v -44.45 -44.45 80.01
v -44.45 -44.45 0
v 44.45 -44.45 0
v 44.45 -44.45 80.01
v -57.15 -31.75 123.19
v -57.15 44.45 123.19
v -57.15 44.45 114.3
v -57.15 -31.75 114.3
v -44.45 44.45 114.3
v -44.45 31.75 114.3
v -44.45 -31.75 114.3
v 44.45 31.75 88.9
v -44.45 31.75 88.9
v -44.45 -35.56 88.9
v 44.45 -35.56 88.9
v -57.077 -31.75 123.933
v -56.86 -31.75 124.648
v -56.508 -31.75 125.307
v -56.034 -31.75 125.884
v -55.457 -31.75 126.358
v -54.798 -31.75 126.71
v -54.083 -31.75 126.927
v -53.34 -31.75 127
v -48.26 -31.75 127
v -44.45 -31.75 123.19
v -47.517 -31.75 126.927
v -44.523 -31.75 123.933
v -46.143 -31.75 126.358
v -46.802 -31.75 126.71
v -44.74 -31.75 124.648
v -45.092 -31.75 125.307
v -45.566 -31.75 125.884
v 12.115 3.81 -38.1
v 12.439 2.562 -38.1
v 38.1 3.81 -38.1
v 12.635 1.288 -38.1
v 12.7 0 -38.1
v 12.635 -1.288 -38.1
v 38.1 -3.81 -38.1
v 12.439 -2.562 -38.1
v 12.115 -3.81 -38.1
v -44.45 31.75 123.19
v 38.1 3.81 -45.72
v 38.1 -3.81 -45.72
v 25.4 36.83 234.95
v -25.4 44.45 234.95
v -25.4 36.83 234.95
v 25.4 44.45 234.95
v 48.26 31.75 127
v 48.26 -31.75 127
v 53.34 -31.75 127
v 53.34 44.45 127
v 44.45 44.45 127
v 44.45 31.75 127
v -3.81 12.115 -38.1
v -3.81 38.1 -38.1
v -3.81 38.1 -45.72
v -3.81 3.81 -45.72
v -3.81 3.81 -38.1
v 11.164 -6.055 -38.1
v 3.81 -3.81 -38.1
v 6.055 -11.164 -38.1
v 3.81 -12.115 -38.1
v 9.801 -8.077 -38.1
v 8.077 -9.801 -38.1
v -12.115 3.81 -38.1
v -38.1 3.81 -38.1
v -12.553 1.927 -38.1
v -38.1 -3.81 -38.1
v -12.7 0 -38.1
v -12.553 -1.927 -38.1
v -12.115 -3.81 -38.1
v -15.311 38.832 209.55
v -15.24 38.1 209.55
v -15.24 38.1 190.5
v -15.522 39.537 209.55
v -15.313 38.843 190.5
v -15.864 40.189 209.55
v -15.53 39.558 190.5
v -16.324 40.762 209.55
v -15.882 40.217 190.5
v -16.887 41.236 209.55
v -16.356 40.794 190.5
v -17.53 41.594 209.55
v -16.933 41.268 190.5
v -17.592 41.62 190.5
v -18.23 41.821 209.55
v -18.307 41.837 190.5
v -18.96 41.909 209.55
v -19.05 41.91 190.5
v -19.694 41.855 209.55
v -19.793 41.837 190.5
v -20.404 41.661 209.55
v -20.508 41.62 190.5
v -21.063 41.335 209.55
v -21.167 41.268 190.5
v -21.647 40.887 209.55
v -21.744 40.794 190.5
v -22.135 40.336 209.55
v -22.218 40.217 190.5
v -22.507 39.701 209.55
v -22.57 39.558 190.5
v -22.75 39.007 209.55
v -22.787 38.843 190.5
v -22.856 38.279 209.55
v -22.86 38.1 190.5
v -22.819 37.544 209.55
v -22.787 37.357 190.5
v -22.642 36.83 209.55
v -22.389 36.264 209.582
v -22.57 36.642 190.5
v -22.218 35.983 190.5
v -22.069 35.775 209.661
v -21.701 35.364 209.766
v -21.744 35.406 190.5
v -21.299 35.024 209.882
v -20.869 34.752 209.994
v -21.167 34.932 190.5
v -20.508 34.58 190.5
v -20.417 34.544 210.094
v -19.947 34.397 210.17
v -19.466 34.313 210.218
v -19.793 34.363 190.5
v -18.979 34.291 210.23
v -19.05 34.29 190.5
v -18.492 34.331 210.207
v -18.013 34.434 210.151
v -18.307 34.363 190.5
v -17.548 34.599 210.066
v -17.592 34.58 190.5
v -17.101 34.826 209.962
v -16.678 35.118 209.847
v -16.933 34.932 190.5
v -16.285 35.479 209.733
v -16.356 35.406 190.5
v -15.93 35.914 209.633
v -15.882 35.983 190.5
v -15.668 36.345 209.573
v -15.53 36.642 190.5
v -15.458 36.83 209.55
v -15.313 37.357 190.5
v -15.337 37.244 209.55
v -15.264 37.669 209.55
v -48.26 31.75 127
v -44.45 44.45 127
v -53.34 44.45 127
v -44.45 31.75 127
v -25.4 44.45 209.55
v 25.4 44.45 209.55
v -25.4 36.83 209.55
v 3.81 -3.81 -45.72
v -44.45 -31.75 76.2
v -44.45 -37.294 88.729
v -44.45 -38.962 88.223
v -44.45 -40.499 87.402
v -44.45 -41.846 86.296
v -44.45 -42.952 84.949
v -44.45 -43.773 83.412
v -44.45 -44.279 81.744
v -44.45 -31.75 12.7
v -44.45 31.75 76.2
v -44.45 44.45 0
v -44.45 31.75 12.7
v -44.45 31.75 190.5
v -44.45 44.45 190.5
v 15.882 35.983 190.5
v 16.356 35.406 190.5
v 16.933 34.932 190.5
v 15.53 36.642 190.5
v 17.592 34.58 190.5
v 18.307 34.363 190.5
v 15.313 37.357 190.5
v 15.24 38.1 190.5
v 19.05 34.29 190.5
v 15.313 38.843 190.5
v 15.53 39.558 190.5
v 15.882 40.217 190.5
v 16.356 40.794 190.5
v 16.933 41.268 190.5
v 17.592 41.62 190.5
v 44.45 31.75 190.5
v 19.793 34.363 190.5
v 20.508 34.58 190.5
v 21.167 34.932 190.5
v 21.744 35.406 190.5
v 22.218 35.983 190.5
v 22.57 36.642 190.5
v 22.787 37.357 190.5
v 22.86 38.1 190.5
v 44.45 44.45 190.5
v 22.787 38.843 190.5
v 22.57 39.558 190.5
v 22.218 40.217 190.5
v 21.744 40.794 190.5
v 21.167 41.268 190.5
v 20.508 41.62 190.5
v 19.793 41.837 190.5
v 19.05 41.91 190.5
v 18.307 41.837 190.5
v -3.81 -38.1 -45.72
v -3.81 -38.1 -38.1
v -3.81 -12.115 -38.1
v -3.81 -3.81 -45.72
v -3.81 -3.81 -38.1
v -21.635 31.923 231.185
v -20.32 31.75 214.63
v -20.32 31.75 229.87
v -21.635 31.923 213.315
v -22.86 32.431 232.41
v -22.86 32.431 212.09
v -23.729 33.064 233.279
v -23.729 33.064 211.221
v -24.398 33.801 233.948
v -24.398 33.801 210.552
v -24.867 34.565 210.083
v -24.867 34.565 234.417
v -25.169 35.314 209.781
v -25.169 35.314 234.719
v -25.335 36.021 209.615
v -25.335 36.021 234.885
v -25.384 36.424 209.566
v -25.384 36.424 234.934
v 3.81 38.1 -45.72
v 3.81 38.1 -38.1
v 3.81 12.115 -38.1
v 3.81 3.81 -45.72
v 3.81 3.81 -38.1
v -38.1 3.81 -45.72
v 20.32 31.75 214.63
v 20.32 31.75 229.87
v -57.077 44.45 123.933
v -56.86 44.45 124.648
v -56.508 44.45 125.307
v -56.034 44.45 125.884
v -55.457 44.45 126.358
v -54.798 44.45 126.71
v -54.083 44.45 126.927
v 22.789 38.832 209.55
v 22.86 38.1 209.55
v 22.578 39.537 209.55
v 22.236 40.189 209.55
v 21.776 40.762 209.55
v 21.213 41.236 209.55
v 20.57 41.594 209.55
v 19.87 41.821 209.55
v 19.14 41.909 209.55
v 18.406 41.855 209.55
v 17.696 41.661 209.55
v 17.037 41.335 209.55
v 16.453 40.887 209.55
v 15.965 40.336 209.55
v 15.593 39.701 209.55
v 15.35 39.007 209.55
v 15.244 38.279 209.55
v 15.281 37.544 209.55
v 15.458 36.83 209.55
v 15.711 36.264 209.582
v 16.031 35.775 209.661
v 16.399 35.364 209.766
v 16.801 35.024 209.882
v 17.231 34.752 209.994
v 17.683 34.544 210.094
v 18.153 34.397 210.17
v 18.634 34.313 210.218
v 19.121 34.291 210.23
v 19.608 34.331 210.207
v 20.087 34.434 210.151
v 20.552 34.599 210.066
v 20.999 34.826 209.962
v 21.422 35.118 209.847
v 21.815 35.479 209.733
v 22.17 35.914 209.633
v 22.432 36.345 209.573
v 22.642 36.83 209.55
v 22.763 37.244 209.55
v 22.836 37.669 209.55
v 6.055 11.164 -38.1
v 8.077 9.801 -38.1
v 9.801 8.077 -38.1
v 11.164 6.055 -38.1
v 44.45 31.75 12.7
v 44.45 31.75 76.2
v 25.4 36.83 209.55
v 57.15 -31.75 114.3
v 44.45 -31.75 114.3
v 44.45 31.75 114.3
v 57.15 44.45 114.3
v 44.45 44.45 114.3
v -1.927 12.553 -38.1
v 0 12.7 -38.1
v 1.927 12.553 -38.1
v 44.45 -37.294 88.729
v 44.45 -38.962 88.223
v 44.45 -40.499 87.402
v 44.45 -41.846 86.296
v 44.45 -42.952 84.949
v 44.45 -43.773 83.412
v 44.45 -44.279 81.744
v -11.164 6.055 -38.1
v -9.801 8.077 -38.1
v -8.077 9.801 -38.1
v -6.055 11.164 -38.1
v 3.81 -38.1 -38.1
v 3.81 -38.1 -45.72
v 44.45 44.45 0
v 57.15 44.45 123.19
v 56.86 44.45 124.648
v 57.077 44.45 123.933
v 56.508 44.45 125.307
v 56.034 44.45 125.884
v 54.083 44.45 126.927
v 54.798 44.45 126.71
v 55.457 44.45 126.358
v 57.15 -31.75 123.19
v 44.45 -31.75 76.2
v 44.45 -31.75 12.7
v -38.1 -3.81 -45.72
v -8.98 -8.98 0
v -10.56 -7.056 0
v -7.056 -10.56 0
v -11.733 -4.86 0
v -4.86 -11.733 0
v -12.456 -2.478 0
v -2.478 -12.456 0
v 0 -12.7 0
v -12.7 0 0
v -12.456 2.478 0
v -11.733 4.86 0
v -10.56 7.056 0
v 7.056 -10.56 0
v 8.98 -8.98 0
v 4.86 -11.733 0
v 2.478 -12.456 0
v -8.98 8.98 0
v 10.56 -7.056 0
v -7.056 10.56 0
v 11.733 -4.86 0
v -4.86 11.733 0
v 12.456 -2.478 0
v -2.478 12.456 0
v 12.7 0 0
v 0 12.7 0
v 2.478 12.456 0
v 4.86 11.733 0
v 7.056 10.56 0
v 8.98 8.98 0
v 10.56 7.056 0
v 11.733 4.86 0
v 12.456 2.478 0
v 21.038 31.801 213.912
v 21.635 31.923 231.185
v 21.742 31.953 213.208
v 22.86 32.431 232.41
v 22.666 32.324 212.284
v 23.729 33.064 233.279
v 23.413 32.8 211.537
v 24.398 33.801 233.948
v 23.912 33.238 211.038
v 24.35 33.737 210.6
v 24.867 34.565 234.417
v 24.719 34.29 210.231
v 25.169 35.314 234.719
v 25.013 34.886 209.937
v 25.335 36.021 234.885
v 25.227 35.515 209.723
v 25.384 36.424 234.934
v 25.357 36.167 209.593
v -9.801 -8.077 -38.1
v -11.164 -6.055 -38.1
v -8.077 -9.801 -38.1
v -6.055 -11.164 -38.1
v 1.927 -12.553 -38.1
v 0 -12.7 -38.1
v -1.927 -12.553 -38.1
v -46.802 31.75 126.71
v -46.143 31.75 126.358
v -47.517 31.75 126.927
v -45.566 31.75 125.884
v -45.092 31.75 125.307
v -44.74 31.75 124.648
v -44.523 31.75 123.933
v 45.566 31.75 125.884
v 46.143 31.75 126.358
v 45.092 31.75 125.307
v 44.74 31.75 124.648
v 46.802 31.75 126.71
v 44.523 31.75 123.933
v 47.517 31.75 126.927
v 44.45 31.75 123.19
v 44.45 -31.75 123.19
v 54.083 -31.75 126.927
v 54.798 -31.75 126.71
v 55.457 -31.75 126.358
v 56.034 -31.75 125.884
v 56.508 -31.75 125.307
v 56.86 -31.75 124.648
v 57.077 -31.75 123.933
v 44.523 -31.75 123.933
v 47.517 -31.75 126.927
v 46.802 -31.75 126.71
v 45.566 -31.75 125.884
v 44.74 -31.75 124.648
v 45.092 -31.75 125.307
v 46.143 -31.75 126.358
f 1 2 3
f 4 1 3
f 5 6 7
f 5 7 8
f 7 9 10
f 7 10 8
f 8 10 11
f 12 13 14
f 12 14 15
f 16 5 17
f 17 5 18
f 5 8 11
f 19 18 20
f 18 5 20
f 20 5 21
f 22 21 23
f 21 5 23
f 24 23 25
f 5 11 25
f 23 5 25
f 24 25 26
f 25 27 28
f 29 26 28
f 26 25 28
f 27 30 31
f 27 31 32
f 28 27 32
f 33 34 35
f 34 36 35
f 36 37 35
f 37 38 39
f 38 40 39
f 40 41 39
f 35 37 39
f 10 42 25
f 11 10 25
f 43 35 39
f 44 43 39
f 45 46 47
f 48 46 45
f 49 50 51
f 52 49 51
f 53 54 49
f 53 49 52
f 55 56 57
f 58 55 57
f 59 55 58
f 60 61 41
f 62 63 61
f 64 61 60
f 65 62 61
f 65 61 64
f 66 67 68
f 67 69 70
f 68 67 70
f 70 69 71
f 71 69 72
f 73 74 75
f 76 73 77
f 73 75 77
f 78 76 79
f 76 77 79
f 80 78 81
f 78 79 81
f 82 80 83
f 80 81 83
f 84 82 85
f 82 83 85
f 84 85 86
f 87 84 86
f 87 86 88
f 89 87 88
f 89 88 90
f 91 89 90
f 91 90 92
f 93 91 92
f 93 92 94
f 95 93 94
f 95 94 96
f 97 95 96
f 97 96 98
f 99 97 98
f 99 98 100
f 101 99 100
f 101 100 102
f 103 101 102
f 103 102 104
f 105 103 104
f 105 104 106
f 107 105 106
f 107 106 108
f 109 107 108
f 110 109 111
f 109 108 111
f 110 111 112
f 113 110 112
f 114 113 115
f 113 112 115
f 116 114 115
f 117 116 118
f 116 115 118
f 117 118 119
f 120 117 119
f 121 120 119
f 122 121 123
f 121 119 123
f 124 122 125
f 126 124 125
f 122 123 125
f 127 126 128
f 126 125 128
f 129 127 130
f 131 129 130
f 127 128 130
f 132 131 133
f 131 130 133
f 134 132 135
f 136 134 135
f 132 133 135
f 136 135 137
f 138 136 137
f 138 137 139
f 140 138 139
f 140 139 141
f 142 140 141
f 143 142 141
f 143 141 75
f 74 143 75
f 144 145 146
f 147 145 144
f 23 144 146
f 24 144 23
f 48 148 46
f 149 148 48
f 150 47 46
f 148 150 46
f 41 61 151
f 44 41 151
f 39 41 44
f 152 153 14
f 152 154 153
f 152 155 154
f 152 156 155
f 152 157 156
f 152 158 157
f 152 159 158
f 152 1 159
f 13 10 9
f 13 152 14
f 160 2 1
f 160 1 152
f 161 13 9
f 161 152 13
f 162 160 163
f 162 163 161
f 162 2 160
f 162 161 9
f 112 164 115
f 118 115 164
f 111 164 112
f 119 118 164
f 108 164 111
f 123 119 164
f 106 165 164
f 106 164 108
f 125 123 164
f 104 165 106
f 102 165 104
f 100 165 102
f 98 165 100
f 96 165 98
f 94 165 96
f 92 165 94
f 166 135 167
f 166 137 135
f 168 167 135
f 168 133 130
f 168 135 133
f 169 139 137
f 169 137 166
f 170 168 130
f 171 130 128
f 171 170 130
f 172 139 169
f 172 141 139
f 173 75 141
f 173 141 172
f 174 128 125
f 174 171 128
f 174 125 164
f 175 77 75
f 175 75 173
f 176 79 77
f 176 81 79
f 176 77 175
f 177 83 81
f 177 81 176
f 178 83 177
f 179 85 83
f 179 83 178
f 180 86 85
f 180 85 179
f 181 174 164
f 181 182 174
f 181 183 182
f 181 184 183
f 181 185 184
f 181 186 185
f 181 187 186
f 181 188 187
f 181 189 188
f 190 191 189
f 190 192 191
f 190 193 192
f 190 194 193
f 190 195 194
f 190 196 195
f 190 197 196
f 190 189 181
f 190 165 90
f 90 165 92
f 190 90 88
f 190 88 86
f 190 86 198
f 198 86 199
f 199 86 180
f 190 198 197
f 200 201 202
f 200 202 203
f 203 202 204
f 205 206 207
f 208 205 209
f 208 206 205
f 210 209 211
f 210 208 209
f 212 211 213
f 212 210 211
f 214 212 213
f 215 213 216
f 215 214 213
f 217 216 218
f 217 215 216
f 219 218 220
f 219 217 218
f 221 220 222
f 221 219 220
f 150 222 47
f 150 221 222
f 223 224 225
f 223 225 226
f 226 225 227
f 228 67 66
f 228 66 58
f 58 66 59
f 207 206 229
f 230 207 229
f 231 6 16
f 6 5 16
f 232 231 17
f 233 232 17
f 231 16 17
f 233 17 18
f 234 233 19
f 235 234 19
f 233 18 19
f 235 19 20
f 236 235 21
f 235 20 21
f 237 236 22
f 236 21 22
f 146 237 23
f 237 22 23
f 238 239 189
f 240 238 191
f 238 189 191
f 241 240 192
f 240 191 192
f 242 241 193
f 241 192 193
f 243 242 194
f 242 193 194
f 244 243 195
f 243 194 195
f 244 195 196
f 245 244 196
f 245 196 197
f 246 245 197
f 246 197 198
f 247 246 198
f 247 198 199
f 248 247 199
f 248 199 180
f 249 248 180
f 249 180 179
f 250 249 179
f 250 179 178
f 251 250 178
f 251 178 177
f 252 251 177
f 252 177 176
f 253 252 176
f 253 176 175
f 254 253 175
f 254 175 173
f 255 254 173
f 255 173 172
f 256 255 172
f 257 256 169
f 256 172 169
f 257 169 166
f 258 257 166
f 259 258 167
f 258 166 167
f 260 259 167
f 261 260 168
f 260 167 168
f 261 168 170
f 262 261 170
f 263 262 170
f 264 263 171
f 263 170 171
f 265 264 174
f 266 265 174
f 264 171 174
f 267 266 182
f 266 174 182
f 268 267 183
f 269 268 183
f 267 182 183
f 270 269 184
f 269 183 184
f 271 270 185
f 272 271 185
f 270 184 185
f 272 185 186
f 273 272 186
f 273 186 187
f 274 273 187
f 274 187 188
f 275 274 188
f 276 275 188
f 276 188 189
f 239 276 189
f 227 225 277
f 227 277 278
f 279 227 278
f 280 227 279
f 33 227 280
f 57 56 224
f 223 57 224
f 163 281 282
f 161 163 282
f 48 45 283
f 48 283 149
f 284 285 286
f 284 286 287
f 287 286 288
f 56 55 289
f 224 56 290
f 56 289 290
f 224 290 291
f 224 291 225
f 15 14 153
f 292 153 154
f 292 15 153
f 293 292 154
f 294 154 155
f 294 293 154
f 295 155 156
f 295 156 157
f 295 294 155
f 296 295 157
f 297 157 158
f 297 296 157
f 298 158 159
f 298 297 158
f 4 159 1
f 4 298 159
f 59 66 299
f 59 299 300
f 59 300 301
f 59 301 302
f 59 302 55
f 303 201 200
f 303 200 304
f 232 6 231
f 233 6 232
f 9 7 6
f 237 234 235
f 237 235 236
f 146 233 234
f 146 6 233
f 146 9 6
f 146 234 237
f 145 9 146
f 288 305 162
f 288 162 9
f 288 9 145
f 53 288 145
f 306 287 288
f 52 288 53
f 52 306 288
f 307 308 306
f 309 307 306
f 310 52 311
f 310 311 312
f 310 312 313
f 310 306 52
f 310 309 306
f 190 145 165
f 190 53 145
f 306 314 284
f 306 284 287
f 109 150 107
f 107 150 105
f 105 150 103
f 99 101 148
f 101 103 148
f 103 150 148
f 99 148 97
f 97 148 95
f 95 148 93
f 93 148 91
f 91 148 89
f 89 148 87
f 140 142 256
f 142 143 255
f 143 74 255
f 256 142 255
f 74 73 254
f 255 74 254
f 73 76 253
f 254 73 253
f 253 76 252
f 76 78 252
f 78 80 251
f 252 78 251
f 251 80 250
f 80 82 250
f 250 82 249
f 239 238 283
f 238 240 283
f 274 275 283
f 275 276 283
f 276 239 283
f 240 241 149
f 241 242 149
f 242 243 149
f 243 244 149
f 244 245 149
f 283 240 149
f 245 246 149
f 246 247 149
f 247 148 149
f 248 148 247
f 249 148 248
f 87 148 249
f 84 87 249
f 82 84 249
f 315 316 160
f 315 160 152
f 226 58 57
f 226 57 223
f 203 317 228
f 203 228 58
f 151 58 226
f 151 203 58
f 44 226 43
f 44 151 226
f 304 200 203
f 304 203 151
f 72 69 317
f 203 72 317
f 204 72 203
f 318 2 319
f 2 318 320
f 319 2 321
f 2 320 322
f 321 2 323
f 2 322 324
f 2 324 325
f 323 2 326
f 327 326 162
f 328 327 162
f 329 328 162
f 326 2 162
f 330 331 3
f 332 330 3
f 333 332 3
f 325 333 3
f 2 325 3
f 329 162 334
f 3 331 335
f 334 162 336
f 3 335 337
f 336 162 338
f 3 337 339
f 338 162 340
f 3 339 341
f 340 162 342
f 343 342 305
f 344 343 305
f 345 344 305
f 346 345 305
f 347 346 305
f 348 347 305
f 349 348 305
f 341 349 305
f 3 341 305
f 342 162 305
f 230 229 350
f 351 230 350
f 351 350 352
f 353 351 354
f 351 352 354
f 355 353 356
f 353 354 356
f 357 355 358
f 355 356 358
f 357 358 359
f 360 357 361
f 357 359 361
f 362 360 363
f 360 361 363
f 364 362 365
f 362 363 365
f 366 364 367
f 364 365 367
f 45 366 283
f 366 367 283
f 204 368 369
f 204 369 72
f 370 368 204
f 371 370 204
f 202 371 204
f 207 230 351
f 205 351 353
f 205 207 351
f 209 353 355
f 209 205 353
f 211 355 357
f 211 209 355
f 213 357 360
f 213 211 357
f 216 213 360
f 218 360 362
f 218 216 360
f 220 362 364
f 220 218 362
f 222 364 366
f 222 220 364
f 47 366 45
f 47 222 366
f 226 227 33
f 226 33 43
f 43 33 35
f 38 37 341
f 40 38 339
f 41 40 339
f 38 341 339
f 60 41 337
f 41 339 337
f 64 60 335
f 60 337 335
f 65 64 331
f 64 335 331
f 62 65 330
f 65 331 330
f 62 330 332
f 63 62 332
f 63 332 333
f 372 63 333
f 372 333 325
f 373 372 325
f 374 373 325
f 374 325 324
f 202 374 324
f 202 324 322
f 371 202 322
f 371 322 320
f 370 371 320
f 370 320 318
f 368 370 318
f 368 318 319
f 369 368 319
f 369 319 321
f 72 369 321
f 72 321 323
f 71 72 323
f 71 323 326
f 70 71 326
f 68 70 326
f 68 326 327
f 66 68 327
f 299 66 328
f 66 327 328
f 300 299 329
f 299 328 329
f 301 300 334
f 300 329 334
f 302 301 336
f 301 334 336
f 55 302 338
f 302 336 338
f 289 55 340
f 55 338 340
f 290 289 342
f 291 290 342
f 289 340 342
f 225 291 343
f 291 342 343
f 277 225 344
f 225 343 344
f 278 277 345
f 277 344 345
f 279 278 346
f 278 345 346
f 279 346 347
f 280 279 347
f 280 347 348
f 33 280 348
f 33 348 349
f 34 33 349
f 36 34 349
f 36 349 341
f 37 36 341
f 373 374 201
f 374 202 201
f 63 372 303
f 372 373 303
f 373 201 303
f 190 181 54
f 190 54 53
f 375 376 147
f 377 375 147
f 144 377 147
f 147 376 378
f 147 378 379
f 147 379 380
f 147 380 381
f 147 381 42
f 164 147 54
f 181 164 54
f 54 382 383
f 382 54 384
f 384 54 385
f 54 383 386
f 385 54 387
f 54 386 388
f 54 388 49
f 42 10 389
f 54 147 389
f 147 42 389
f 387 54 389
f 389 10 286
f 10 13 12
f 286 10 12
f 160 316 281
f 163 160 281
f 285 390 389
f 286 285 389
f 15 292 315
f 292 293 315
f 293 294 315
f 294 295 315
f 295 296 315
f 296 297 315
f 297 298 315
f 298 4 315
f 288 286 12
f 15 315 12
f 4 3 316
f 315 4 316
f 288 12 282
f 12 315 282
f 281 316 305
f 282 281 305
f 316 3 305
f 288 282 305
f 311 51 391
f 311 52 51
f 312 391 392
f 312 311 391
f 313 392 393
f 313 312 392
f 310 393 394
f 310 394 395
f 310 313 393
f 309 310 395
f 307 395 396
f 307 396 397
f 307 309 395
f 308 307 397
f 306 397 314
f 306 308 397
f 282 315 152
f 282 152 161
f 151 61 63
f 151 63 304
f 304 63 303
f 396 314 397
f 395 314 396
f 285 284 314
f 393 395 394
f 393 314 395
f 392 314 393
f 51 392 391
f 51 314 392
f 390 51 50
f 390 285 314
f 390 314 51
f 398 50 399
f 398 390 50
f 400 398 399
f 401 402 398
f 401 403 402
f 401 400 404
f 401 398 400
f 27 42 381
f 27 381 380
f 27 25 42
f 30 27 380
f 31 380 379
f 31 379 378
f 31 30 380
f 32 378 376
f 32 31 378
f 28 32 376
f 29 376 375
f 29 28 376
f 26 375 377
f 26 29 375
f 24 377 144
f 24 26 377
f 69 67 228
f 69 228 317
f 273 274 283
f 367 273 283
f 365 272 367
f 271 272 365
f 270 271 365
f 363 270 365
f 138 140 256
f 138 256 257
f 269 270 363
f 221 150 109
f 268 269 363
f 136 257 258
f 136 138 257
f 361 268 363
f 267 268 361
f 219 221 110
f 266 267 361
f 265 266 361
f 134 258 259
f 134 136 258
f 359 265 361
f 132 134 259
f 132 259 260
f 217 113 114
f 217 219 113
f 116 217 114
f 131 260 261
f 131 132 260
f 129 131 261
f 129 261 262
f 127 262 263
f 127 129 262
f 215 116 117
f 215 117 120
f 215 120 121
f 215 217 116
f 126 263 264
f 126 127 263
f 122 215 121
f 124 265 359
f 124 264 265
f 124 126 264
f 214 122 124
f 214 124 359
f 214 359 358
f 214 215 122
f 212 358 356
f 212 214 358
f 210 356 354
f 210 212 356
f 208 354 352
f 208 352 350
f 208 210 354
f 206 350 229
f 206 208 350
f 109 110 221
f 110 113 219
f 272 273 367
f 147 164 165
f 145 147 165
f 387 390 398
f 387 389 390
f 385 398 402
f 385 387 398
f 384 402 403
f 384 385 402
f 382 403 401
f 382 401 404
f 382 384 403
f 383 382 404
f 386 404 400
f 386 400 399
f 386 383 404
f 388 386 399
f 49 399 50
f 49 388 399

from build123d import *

# Parameters (mm, degrees)
F0_W          = 88.9
F0_H          = 88.9
F1_DEPTH      = 88.9
F2_W          = 63.5
F2_H          = 63.5
F3_DEPTH      = 88.9
F4_W          = 88.9
F4_H          = 12.7
F5_DEPTH      = 101.6
F6_R          = 12.7
F7_DEPTH      = 38.1
F8_W          = 7.62
F8_H          = 34.29
F8_H_2        = 7.62
F8_W_2        = 34.29
F9_DEPTH      = 7.62
F10_W         = 76.2
F10_H         = 12.7
F11_DEPTH     = 12.7
F12_W         = 76.2
F12_H         = 12.7
F13_DEPTH     = 12.7
F14_R         = 3.81
F15_DEPTH     = 19.05
F16_W         = 50.8
F16_H         = 12.7
F17_DEPTH     = 25.4
F18_R         = 8.89
F19_T1_DEPTH  = 76.2
F19_T3_DEPTH  = 50.8
F19_T8_DEPTH  = 76.2
F19_S9_R      = 3.81
F19_T10_DEPTH = 40
F19_S11_R     = 3.81
F19_T12_DEPTH = 40
F20_R         = 3.81


# Not quite as in the source:
# - a fillet or chamfer that OpenCascade refuses, or shapes differently, is made with other operations: its cross-section is extruded or revolved along the edge and cut away or added


with BuildPart() as f1:
    # F0 (on Top) → F1 (new body)
    with BuildSketch(Plane.XY):
        Rectangle(F0_W, F0_H)
    extrude(amount=F1_DEPTH)

    # F2 (on face) → F3 (cut)
    with BuildSketch(Plane.YZ.offset(44.45)):
        with Locations((0, 44.45)):
            Rectangle(F2_W, F2_H)
    extrude(amount=-F3_DEPTH, mode=Mode.SUBTRACT)

    # F4 (on face) → F5 (join)
    with BuildSketch(Plane.XY.offset(88.9)):
        with Locations((0, 38.1)):
            Rectangle(F4_W, F4_H)
    extrude(amount=F5_DEPTH)

    # F6 (on face) → F7 (join)
    with BuildSketch(Plane(origin=(0, 0, 0), x_dir=(1, 0, 0), z_dir=(0, 0, -1))):
        Circle(F6_R)
    extrude(amount=F7_DEPTH)

    # F8 (on face) → F9 (join)
    with BuildSketch(Plane(origin=(0, 0, -38.1), x_dir=(1, 0, 0), z_dir=(0, 0, -1))):
        with Locations((0, 20.955)):
            Rectangle(F8_W, F8_H)
        Rectangle(F8_W, F8_H_2)
        with Locations((-20.955, 0)):
            Rectangle(F8_W_2, F8_H_2)
        with Locations((20.955, 0)):
            Rectangle(F8_W_2, F8_H_2)
        with Locations((0, -20.955)):
            Rectangle(F8_W, F8_H)
    extrude(amount=F9_DEPTH)

    # F10 (on face) → F11 (join)
    with BuildSketch(Plane.YZ.offset(44.45)):
        with Locations((6.35, 120.65)):
            Rectangle(F10_W, F10_H)
    extrude(amount=F11_DEPTH)

    # F12 (on face) → F13 (join)
    with BuildSketch(Plane(origin=(-44.45, 0, 0), x_dir=(0, -1, 0), z_dir=(-1, 0, 0))):
        with Locations((-6.35, 120.65)):
            Rectangle(F12_W, F12_H)
    extrude(amount=F13_DEPTH)

    # F14 (on face) → F15 (join)
    with BuildSketch(Plane.XY.offset(190.5)):
        with Locations((19.05, 38.1)):
            Circle(F14_R)
        with Locations((-19.05, 38.1)):
            Circle(F14_R)
    extrude(amount=F15_DEPTH)

    # F16 (on face) → F17 (join)
    with BuildSketch(Plane.XY.offset(209.55)):
        with Locations((0, 38.1)):
            Rectangle(F16_W, F16_H)
    extrude(amount=F17_DEPTH)

    # F18
    f18_edges = [f1.edges().sort_by_distance(p)[0] for p in [
        (0, -44.45, 88.9),
    ]]
    fillet(f18_edges, radius=F18_R)

    # F19: fillet of radius 5.08 on 4 edges, made by hand

    # F19_s2 → F19_t1 (cut)
    with BuildSketch(Plane.YZ.offset(-38.1)):
        with BuildLine():
            ThreePointArc((31.75, 229.87), (33.2378975516, 233.4621024484), (36.83, 234.95))
            Line((36.83, 234.95), (31.75, 234.95))
            Line((31.75, 234.95), (31.75, 229.87))
        make_face()
    extrude(amount=F19_T1_DEPTH, mode=Mode.SUBTRACT)

    # F19_s4 → F19_t3 (cut)
    with BuildSketch(Plane.XY.offset(196.85)):
        with BuildLine():
            ThreePointArc((20.32, 31.75), (23.9121024484, 33.2378975516), (25.4, 36.83))
            Line((25.4, 36.83), (25.4, 31.75))
            Line((25.4, 31.75), (20.32, 31.75))
        make_face()
        with BuildLine():
            ThreePointArc((-20.32, 31.75), (-23.9121024484, 33.2378975516), (-25.4, 36.83))
            Line((-25.4, 36.83), (-25.4, 31.75))
            Line((-25.4, 31.75), (-20.32, 31.75))
        make_face()
    extrude(amount=F19_T3_DEPTH, mode=Mode.SUBTRACT)


with BuildPart() as f19_tool6:
    # F19_s7 → F19_t8 (new body)
    with BuildSketch(Plane.YZ.offset(-38.1)):
        with BuildLine():
            ThreePointArc((36.83, 209.55), (33.2378975516, 211.0378975516), (31.75, 214.63))
            Line((31.75, 214.63), (31.75, 209.55))
            Line((31.75, 209.55), (36.83, 209.55))
        make_face()
    extrude(amount=F19_T8_DEPTH)

    # F19_s9 → F19_t10 (cut, symmetric)
    with BuildSketch(Plane.XY.offset(212.1)):
        with Locations((-19.05, 38.1)):
            Circle(F19_S9_R)
    extrude(amount=F19_T10_DEPTH, both=True, mode=Mode.SUBTRACT)

    # F19_s11 → F19_t12 (cut, symmetric)
    with BuildSketch(Plane.XY.offset(212.1)):
        with Locations((19.05, 38.1)):
            Circle(F19_S11_R)
    extrude(amount=F19_T12_DEPTH, both=True, mode=Mode.SUBTRACT)


with BuildPart() as f1_1:
    add(f1.part)

    # F19_t5: cut F19_tool6
    add(f19_tool6.part, mode=Mode.SUBTRACT)

    # F20
    f20_edges = [f1_1.edges().sort_by_distance(p)[0] for p in [
        (44.45, 0, 127),
        (57.15, 6.35, 127),
        (-44.45, 0, 127),
        (-57.15, 6.35, 127),
    ]]
    fillet(f20_edges, radius=F20_R)


solid = f1_1.part
